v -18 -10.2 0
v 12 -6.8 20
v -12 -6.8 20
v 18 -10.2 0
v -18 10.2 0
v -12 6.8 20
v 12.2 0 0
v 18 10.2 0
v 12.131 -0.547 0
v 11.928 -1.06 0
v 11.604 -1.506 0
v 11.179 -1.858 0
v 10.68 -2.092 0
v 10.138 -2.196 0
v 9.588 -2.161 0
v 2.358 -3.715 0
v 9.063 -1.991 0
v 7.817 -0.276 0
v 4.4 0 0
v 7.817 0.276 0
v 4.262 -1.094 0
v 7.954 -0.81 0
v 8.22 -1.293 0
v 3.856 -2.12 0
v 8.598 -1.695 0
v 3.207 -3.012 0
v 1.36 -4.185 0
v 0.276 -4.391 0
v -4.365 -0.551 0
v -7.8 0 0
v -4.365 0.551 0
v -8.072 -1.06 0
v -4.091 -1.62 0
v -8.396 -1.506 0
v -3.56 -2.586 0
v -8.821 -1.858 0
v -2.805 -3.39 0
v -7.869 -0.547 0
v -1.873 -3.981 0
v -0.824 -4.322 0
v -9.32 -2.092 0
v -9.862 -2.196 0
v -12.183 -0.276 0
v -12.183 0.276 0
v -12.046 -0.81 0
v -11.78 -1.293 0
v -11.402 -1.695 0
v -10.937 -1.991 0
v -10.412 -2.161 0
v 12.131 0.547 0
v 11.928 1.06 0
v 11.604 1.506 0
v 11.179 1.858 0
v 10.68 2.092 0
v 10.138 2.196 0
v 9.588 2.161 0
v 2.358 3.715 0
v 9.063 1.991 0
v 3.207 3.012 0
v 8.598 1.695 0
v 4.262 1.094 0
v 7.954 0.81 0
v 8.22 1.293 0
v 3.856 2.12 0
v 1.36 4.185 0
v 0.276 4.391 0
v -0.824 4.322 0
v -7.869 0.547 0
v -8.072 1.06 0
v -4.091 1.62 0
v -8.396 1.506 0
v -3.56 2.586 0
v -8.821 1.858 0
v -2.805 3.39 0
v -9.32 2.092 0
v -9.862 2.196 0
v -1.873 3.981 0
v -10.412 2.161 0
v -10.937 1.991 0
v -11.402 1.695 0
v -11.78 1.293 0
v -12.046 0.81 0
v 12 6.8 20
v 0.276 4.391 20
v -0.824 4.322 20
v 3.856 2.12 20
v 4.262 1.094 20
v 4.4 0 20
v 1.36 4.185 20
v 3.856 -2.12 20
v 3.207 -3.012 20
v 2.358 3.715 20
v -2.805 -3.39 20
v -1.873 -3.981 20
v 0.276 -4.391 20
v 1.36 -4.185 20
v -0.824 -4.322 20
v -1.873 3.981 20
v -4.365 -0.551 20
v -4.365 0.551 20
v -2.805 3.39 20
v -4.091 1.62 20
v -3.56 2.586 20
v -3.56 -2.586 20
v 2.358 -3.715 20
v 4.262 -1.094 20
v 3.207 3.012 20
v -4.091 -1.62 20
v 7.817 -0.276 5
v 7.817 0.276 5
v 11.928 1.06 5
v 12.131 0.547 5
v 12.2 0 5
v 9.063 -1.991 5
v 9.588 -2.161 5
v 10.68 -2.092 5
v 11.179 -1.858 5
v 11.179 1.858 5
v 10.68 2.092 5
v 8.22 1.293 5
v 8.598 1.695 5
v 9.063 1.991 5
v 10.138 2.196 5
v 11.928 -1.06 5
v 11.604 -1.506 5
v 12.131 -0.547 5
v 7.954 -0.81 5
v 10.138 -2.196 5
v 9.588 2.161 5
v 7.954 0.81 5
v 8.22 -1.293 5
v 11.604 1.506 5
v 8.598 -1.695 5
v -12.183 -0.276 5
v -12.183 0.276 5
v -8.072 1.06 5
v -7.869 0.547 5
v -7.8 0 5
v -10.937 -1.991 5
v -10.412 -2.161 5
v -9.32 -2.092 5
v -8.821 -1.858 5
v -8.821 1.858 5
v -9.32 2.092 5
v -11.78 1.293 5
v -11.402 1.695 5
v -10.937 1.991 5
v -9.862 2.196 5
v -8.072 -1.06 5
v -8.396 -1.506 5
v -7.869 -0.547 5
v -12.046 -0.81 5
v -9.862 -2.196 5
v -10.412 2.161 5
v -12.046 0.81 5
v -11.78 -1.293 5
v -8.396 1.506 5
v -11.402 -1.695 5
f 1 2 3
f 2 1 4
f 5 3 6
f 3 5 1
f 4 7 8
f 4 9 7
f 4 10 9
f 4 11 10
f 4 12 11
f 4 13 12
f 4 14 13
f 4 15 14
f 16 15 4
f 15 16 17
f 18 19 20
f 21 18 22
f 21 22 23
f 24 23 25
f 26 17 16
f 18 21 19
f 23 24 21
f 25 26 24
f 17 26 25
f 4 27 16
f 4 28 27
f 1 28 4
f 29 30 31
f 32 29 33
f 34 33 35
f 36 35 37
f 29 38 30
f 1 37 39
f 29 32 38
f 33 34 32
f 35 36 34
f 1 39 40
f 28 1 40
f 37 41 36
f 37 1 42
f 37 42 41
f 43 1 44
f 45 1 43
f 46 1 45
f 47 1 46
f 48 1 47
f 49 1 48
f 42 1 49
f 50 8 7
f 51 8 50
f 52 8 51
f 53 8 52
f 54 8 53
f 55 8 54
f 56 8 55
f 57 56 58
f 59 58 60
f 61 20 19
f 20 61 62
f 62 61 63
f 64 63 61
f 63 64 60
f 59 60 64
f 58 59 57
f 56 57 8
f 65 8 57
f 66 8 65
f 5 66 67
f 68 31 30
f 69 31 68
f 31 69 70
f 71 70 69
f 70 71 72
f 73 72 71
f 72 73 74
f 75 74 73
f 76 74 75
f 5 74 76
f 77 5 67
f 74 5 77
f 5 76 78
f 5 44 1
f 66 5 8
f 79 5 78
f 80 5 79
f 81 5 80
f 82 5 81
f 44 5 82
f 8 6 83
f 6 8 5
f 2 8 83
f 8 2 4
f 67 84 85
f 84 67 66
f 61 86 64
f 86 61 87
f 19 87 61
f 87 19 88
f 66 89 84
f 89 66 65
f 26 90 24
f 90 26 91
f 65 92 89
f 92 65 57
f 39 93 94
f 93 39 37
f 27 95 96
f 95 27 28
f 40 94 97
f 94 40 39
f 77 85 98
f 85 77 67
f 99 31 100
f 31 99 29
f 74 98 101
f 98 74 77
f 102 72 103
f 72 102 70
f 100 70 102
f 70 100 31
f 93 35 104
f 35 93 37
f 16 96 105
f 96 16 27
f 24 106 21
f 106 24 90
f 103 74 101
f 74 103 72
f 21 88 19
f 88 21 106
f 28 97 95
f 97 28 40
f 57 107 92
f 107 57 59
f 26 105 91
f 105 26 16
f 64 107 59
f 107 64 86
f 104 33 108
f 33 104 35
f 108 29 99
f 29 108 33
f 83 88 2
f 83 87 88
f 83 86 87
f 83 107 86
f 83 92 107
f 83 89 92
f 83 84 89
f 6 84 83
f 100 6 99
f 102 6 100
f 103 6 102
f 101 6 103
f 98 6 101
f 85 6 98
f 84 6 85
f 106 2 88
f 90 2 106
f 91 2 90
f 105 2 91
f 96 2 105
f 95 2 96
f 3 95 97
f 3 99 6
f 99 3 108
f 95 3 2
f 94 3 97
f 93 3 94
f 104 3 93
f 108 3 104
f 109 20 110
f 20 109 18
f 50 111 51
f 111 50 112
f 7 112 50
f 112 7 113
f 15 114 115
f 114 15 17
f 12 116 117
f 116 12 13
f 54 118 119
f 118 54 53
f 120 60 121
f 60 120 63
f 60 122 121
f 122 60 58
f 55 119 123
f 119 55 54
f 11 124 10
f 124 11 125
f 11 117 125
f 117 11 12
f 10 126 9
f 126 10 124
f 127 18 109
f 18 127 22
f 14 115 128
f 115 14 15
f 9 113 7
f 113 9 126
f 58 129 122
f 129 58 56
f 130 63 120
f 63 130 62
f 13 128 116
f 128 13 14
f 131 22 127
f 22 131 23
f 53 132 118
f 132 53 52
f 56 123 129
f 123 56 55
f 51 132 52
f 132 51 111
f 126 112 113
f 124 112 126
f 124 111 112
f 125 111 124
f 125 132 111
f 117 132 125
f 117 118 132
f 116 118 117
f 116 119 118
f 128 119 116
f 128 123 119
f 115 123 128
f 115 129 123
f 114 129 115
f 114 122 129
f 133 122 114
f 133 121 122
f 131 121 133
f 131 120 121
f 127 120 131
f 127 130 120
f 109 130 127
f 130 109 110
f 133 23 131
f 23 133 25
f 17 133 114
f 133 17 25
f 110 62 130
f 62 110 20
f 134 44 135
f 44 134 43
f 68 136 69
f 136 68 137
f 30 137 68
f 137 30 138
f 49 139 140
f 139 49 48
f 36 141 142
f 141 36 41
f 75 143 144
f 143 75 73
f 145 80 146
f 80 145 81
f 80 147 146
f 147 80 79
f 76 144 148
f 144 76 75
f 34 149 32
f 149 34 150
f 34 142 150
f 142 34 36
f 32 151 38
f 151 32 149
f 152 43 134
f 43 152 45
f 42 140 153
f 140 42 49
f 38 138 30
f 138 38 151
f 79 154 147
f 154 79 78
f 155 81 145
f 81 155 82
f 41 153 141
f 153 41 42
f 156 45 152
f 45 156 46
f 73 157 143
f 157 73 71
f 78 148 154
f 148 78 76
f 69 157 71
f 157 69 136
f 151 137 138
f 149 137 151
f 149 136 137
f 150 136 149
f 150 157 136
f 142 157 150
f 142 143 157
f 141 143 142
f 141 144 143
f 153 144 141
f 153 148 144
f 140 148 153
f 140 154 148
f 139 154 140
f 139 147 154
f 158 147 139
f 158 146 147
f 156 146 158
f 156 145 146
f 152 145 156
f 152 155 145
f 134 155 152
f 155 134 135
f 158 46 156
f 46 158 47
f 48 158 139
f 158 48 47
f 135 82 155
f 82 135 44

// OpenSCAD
$fn = 25;

x_1 = 30.0; // at connection line = inner coil size
y_1 = 16.5 + 0.5;
d_1 = 8.0; // axis diameter

r_1 = d_1 / 2 + 0.4;

l_0 = 50.0; // length from baseline to top perspective
l_a = 10.0; // under baseline
l_b = 10.0; // above baseline
l_tot = l_0 + l_a;
z_all = l_a + l_b;

k_xy = ( l_tot ) / l_0;
x_0 = x_1 * k_xy;
y_0 = y_1 * k_xy;
echo( x_0, " ", y_0 );


difference() {
  linear_extrude( height=l_tot,  scale=0.0 )
    translate([-x_0/2,-y_0/2]) square( [x_0,y_0]);
  cylinder( r=r_1, h=l_tot );
  translate([-x_0/2,-y_0/2,z_all]) cube([x_0,y_0,l_0]);
  translate([ 10,0,0]) cylinder( r=2.2, h=5 ); //  for forcer bolt
  translate([-10,0,0]) cylinder( r=2.2, h=5 ); //  for forcer bolt
}
